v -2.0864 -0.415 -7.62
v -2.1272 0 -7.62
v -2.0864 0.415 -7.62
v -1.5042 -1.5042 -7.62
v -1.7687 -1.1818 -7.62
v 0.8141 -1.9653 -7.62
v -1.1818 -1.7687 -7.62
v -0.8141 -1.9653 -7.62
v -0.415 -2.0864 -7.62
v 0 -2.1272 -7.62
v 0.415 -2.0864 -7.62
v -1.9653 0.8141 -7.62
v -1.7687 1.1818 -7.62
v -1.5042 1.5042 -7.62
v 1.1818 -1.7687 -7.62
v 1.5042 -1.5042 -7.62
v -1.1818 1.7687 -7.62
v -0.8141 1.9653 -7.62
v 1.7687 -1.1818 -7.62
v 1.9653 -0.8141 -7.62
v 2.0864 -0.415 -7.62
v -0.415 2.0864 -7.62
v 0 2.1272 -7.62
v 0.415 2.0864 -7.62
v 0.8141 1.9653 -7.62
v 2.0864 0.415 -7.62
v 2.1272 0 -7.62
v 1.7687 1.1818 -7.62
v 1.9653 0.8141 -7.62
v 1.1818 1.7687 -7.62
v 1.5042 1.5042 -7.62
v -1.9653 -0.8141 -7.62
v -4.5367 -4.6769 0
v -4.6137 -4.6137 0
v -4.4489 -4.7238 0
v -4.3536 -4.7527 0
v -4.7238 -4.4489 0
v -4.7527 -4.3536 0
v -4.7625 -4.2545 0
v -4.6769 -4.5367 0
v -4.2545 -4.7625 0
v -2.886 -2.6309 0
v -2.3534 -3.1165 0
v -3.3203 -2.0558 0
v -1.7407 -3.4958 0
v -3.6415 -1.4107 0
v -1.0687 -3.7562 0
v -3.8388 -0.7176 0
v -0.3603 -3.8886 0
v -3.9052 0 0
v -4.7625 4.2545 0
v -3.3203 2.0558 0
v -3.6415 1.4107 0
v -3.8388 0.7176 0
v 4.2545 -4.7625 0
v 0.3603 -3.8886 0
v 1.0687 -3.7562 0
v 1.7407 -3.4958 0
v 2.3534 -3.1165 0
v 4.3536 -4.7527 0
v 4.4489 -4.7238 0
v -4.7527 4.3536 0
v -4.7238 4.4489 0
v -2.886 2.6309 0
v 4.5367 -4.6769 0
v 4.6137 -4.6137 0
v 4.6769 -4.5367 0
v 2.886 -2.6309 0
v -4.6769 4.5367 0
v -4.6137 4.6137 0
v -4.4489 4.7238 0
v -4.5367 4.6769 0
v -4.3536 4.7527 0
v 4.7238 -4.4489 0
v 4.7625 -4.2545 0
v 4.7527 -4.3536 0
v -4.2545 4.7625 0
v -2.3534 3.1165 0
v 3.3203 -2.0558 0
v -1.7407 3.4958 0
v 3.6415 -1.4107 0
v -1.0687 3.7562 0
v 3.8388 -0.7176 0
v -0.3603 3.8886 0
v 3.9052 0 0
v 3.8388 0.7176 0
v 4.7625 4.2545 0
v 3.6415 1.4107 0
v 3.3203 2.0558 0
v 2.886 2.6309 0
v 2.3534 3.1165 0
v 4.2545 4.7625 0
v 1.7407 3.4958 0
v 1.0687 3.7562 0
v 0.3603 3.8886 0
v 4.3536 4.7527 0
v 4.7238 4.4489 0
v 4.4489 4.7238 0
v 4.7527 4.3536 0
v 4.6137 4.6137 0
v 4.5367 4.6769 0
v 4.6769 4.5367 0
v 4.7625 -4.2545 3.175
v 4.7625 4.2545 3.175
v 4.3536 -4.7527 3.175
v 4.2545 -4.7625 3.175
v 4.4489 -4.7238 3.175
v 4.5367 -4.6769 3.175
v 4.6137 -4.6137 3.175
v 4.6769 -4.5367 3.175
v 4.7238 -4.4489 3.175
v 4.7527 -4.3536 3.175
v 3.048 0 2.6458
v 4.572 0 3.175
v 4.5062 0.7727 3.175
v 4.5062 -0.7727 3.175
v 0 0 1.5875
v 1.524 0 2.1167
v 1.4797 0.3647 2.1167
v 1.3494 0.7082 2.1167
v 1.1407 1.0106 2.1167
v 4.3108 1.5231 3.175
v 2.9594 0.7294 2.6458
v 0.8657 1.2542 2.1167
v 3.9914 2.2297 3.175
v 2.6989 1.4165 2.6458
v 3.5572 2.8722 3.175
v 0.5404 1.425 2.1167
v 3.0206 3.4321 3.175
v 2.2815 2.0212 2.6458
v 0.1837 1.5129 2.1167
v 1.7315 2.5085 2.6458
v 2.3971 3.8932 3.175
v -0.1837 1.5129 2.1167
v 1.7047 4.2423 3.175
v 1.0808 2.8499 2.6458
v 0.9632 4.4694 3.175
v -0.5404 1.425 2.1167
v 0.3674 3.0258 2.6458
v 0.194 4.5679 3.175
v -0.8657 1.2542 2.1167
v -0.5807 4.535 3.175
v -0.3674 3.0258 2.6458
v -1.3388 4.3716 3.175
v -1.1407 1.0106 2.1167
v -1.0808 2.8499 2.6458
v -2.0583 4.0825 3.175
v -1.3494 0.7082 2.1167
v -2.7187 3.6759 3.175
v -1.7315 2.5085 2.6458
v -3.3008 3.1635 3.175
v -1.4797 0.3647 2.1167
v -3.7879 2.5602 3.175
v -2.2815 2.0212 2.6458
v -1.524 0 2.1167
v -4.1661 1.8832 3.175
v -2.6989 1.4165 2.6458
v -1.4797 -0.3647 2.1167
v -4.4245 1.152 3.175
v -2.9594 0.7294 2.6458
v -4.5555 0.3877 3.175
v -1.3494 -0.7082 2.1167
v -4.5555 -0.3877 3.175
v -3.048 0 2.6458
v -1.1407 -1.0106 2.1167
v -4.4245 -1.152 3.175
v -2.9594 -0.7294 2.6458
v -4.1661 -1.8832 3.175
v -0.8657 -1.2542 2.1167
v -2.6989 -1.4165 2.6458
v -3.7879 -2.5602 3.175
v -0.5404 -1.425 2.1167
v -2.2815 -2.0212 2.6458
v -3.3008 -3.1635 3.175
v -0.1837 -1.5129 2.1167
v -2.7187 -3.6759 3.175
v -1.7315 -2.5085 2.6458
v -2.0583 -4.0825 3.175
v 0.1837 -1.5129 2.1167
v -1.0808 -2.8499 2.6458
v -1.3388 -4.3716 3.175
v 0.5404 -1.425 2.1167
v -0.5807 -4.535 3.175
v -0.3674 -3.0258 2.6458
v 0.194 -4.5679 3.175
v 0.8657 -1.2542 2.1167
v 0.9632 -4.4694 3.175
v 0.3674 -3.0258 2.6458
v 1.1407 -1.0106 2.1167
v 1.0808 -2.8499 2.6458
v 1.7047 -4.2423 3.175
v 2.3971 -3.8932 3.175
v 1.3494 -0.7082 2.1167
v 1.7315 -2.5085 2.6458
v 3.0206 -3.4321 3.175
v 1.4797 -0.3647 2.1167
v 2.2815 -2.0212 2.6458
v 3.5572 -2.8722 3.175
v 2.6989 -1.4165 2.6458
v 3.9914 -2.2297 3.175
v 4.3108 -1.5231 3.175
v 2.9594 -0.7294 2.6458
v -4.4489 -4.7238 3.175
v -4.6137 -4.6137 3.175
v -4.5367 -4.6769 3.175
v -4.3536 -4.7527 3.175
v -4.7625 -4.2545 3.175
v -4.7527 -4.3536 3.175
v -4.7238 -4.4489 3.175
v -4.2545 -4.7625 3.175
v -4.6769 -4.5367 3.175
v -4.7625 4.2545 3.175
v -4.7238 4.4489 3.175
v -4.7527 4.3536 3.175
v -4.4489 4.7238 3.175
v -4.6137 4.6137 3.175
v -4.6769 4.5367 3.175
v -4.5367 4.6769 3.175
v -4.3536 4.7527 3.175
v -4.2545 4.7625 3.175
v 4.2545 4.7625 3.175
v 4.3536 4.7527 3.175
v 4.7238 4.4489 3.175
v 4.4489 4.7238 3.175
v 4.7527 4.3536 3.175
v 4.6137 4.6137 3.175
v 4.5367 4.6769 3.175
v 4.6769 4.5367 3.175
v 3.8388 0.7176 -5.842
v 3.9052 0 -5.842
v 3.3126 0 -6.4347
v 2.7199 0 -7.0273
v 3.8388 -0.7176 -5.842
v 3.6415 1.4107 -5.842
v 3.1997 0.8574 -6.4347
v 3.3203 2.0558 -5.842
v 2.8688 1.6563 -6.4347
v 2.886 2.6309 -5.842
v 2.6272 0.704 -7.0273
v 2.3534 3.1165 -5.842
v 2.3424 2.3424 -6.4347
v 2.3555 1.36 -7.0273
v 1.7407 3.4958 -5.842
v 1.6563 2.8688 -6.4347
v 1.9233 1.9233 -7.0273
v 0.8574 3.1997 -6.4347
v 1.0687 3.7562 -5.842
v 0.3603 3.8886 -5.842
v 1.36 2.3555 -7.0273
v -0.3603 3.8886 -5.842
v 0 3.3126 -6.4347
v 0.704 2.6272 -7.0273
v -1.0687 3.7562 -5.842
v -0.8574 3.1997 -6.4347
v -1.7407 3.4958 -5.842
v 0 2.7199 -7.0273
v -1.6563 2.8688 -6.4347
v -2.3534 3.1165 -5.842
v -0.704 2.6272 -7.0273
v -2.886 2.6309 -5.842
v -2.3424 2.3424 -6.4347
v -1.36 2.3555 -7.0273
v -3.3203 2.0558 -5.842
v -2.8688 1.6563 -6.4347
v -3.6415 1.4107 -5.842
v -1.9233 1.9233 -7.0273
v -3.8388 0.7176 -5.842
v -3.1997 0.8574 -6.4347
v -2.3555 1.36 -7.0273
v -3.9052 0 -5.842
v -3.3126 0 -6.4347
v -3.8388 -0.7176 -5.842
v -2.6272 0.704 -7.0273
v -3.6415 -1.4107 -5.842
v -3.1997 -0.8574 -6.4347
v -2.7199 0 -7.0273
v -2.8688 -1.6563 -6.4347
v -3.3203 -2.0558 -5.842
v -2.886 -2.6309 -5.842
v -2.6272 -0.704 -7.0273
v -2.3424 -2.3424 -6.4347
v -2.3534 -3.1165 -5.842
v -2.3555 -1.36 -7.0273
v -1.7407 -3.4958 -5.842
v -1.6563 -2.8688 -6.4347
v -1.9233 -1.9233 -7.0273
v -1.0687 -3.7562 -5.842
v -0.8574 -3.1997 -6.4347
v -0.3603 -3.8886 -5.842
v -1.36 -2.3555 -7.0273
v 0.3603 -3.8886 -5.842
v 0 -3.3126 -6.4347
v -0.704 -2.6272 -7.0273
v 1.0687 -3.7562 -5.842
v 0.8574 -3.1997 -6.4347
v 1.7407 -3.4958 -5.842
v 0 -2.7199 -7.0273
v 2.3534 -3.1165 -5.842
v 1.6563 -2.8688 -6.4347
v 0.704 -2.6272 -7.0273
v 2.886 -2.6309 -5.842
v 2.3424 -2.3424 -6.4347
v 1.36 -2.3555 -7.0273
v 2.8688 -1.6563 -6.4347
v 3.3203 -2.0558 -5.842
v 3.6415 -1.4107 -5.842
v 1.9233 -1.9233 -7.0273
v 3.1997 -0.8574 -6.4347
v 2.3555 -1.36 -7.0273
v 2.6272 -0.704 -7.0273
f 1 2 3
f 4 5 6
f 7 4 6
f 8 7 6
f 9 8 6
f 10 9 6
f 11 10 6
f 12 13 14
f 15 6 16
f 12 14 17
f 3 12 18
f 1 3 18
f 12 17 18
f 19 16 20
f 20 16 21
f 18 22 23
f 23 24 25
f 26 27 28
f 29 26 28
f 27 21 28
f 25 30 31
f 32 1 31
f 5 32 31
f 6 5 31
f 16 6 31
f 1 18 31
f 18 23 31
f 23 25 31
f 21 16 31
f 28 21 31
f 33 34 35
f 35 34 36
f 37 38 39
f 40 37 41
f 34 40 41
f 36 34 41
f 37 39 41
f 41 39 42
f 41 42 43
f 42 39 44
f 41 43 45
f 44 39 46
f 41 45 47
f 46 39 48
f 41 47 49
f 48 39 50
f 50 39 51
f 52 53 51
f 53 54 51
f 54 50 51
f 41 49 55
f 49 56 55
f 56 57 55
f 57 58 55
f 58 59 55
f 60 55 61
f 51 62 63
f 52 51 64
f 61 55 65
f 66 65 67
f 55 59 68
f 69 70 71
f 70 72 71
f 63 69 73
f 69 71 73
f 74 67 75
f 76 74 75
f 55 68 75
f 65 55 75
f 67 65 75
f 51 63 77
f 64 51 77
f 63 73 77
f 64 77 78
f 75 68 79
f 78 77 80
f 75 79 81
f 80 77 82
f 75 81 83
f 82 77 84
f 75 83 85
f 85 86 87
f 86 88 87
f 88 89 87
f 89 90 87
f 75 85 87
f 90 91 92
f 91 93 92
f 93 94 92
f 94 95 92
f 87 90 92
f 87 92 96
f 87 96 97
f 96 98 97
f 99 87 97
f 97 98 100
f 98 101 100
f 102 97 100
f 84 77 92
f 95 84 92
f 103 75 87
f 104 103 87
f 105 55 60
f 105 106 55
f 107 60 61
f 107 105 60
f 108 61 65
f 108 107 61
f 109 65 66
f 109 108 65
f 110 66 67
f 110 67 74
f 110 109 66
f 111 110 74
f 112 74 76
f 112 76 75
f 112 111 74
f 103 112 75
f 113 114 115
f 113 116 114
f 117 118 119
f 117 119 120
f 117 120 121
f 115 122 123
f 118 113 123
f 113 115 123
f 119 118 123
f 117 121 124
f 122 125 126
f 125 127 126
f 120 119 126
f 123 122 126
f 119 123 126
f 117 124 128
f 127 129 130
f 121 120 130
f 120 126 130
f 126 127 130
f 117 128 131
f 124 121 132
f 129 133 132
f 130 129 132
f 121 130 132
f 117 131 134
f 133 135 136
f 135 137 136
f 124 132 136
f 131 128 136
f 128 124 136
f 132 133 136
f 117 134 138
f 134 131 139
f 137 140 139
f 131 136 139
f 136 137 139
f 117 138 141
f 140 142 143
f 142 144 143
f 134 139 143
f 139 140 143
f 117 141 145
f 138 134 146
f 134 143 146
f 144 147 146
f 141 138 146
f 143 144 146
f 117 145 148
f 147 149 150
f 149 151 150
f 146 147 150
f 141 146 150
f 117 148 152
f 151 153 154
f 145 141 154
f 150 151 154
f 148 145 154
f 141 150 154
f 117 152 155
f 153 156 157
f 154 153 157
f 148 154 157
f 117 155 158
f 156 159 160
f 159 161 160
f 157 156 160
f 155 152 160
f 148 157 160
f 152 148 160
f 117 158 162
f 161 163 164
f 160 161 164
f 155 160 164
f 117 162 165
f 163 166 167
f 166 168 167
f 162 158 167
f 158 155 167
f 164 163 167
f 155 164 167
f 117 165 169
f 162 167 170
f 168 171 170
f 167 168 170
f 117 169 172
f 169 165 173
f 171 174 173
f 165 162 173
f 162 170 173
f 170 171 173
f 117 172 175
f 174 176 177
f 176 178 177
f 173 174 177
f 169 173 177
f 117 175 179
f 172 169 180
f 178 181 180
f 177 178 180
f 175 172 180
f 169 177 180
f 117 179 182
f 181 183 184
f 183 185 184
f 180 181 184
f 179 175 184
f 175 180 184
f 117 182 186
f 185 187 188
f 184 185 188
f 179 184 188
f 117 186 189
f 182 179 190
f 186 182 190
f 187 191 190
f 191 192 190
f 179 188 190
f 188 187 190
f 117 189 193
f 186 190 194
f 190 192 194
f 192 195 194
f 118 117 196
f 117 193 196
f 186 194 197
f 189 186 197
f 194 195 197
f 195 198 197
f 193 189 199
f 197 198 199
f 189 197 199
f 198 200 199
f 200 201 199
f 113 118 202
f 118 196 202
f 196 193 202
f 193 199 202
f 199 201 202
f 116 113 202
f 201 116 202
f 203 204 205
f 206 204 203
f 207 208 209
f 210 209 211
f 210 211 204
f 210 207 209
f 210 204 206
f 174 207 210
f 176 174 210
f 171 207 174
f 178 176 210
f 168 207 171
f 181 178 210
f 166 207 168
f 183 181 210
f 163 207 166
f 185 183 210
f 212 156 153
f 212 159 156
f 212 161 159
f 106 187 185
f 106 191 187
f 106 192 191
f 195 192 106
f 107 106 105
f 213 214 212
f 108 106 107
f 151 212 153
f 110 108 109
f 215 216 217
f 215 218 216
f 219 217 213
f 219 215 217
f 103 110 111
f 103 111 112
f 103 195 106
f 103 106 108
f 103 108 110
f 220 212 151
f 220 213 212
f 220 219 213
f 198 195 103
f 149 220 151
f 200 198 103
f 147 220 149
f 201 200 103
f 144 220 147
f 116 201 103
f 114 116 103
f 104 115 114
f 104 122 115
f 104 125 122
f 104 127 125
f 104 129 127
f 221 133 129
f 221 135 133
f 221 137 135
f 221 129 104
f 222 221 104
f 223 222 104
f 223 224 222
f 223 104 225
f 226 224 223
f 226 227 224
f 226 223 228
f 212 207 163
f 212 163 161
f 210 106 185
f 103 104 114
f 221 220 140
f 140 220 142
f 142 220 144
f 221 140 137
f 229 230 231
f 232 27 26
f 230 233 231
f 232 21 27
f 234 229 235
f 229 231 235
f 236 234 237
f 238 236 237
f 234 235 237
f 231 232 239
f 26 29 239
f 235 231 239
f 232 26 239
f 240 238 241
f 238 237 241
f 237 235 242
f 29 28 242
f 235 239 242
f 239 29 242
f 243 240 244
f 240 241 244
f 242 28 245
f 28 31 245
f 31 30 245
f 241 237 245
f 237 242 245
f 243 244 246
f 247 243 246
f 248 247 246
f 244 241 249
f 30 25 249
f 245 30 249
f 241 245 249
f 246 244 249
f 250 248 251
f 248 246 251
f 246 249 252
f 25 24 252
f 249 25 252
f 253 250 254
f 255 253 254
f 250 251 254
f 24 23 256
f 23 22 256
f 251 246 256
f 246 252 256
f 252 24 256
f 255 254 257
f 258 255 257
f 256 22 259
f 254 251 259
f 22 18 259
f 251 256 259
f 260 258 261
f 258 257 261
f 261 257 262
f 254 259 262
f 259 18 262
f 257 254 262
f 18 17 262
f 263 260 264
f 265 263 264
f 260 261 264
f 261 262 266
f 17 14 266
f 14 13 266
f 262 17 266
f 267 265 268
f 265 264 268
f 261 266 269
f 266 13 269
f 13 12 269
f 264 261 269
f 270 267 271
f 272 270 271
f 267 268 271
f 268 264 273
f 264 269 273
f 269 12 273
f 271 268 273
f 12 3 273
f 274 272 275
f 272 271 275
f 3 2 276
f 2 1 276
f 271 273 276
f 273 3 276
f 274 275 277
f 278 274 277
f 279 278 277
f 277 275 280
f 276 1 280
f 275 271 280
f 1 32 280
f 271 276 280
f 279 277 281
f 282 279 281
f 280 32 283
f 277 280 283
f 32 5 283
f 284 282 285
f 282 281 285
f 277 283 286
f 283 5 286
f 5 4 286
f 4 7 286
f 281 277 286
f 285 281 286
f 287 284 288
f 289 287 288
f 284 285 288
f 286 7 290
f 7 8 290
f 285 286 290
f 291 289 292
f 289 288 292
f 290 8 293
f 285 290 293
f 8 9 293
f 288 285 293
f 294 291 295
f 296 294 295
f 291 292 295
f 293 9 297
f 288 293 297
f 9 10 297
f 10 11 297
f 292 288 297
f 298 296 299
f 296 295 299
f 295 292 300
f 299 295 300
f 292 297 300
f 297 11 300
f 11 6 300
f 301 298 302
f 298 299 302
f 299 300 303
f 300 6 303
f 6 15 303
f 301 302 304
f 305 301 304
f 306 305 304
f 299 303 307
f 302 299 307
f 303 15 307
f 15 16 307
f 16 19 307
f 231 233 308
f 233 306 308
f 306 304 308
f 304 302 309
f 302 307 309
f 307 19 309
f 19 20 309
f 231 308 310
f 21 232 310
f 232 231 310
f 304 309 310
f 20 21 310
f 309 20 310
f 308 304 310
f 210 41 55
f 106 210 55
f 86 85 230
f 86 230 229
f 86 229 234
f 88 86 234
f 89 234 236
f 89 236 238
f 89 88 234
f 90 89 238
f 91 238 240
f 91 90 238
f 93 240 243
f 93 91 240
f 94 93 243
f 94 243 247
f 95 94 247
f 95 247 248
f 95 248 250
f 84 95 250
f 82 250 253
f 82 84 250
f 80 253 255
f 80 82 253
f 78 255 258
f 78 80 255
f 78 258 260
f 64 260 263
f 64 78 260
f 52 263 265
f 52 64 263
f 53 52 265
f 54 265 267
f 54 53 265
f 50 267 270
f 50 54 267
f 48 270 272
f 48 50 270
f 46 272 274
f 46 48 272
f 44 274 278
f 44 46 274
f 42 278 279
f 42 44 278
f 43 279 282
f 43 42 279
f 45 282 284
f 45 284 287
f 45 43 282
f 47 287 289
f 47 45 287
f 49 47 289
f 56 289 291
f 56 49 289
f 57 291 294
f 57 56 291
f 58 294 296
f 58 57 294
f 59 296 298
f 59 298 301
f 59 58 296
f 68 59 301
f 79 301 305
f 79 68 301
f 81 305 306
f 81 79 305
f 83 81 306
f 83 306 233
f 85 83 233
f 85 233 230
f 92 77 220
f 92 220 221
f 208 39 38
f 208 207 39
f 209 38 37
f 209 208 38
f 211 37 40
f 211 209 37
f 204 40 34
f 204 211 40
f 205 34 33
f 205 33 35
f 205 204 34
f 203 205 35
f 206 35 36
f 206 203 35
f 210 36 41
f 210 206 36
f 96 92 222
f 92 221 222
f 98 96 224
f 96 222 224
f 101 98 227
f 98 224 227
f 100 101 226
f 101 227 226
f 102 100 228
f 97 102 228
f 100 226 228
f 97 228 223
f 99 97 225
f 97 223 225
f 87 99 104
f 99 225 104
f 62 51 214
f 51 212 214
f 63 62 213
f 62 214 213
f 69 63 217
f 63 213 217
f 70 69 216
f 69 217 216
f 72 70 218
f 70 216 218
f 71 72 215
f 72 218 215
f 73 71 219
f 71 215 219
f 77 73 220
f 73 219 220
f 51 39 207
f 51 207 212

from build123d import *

# Parameters (mm, degrees)
F0_R     = 3.90525
F1_DEPTH = 7.62
F2_W     = 9.525
F2_H     = 9.525
F3_DEPTH = 3.175
F6_R     = 0.508
F7_SIZE  = 1.778


with BuildPart() as f1:
    # F0 (on Top) → F1 (new body)
    with BuildSketch(Plane.XY):
        Circle(F0_R)
    extrude(amount=-F1_DEPTH)

    # F2 (on face) → F3 (join)
    with BuildSketch(Plane.XY):
        Rectangle(F2_W, F2_H)
    extrude(amount=F3_DEPTH)

    # F4 (on Front) → F5 (revolve, cut)
    with BuildSketch(Plane.XZ):
        Polygon((0, 1.5875), (4.572, 3.175), (0, 3.175), align=None)
    revolve(axis=Axis((0, 0, 2.38125), (0, 0, 1)), mode=Mode.SUBTRACT)

    # F6
    f6_edges = [f1.edges().sort_by_distance(p)[0] for p in [
        (-4.7625, 4.7625, 1.5875),
        (4.7625, 4.7625, 1.5875),
        (-4.7625, -4.7625, 1.5875),
        (4.7625, -4.7625, 1.5875),
    ]]
    fillet(f6_edges, radius=F6_R)

    # F7
    f7_edges = [f1.edges().sort_by_distance(p)[0] for p in [
        (-3.90525, 0, -7.62),
    ]]
    chamfer(f7_edges, length=F7_SIZE)


solid = f1.part
